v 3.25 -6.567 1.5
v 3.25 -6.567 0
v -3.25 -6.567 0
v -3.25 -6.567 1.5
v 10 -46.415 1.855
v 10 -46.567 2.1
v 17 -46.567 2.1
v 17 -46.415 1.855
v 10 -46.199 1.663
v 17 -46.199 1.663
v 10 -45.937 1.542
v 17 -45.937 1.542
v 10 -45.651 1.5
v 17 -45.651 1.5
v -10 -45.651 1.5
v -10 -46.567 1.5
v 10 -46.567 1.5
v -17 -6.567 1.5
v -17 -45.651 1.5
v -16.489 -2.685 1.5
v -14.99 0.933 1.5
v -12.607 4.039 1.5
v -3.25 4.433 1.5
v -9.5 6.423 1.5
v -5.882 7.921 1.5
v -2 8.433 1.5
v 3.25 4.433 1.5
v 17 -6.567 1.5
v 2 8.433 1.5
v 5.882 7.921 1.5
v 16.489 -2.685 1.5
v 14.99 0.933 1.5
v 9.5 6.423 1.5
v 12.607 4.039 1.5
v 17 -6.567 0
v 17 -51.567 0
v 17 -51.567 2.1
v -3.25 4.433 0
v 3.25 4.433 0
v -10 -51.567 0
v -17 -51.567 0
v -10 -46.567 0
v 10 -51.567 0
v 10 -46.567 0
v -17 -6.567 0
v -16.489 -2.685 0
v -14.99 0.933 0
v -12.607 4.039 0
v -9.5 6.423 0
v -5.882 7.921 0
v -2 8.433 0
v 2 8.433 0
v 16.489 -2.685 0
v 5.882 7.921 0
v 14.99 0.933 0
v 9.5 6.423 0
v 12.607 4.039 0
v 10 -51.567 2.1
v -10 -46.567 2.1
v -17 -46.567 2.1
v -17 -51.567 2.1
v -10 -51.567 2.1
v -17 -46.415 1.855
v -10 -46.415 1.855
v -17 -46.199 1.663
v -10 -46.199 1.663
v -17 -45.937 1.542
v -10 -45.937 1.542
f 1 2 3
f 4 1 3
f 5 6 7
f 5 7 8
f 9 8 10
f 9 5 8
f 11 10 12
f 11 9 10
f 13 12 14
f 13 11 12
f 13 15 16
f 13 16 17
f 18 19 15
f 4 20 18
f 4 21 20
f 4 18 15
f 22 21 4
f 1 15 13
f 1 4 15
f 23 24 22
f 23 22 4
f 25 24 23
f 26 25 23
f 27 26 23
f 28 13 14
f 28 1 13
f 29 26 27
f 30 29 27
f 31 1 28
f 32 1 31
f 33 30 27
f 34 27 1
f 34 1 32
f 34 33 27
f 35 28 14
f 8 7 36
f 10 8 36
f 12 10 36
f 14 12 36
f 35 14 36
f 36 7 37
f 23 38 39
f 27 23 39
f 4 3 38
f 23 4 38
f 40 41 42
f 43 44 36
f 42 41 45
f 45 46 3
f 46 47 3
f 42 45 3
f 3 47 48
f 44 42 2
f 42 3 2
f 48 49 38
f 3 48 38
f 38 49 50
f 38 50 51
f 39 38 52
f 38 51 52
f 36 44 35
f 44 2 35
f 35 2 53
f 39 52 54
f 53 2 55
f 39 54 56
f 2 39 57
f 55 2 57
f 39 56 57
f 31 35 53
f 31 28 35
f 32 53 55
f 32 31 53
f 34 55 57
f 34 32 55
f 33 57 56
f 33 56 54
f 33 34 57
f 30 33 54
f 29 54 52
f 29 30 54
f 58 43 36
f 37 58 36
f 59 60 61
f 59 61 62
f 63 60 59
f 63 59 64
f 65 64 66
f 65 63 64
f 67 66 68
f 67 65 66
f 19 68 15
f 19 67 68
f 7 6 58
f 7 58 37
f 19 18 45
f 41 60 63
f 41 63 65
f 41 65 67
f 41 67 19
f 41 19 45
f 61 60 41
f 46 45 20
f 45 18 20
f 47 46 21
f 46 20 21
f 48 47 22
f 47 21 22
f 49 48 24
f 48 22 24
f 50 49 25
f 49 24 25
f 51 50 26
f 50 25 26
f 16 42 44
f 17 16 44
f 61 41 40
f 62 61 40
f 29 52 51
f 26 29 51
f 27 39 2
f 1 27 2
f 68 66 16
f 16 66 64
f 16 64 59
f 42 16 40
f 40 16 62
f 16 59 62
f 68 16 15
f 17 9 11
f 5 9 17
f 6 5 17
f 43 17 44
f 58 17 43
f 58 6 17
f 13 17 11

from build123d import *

# Parameters (mm, degrees)
F0_W        = 7
F0_H        = 5
F1_DEPTH    = 1.5
F2_R        = 15
F3_DEPTH    = 2.1
F4_T1_DEPTH = 7
F4_T3_DEPTH = 7


# Not quite as in the source:
# - a fillet or chamfer that OpenCascade refuses, or shapes differently, is made with other operations: its cross-section is extruded or revolved along the edge and cut away or added


with BuildPart() as f1:
    # F0 (on Top) → F1 (new body)
    with BuildSketch(Plane.XY):
        Polygon((0, 8.4325535595), (-17, 8.4325535595), (-17, -46.5674464405), (-10, -46.5674464405), (0, -46.5674464405), (0, -6.5674464405), (-3.25, -6.5674464405), (-3.25, 4.4325535595), (0, 4.4325535595), align=None)
        Polygon((17, 8.4325535595), (0, 8.4325535595), (0, 4.4325535595), (3.25, 4.4325535595), (3.25, -6.5674464405), (0, -6.5674464405), (0, -46.5674464405), (10, -46.5674464405), (17, -46.5674464405), align=None)
        with Locations((13.5, -49.0674464405)):
            Rectangle(F0_W, F0_H)
        with Locations((-13.5, -49.0674464405)):
            Rectangle(F0_W, F0_H)
    extrude(amount=F1_DEPTH)

    # F2
    f2_edges = [f1.edges().sort_by_distance(p)[0] for p in [
        (17, 8.432554, 0.75),
        (-17, 8.432554, 0.75),
    ]]
    fillet(f2_edges, radius=F2_R)

    # F0 (on Top) → F3 (join)
    with BuildSketch(Plane.XY):
        with Locations((13.5, -49.0674464405)):
            Rectangle(F0_W, F0_H)
        with Locations((-13.5, -49.0674464405)):
            Rectangle(F0_W, F0_H)
    extrude(amount=F3_DEPTH)

    # F4: fillet of radius 1 on 2 edges, made by hand

    # F4_s2 → F4_t1 (join)
    with BuildSketch(Plane.YZ.offset(-17)):
        with BuildLine():
            ThreePointArc((-46.5674464405, 2.1), (-46.198653859, 1.6633399735), (-45.6509313015, 1.5))
            Line((-45.6509313015, 1.5), (-46.5674464405, 1.5))
            Line((-46.5674464405, 1.5), (-46.5674464405, 2.1))
        make_face()
    extrude(amount=F4_T1_DEPTH)

    # F4_s4 → F4_t3 (join)
    with BuildSketch(Plane.YZ.offset(10)):
        with BuildLine():
            ThreePointArc((-46.5674464405, 2.1), (-46.198653859, 1.6633399735), (-45.6509313015, 1.5))
            Line((-45.6509313015, 1.5), (-46.5674464405, 1.5))
            Line((-46.5674464405, 1.5), (-46.5674464405, 2.1))
        make_face()
    extrude(amount=F4_T3_DEPTH)


solid = f1.part
